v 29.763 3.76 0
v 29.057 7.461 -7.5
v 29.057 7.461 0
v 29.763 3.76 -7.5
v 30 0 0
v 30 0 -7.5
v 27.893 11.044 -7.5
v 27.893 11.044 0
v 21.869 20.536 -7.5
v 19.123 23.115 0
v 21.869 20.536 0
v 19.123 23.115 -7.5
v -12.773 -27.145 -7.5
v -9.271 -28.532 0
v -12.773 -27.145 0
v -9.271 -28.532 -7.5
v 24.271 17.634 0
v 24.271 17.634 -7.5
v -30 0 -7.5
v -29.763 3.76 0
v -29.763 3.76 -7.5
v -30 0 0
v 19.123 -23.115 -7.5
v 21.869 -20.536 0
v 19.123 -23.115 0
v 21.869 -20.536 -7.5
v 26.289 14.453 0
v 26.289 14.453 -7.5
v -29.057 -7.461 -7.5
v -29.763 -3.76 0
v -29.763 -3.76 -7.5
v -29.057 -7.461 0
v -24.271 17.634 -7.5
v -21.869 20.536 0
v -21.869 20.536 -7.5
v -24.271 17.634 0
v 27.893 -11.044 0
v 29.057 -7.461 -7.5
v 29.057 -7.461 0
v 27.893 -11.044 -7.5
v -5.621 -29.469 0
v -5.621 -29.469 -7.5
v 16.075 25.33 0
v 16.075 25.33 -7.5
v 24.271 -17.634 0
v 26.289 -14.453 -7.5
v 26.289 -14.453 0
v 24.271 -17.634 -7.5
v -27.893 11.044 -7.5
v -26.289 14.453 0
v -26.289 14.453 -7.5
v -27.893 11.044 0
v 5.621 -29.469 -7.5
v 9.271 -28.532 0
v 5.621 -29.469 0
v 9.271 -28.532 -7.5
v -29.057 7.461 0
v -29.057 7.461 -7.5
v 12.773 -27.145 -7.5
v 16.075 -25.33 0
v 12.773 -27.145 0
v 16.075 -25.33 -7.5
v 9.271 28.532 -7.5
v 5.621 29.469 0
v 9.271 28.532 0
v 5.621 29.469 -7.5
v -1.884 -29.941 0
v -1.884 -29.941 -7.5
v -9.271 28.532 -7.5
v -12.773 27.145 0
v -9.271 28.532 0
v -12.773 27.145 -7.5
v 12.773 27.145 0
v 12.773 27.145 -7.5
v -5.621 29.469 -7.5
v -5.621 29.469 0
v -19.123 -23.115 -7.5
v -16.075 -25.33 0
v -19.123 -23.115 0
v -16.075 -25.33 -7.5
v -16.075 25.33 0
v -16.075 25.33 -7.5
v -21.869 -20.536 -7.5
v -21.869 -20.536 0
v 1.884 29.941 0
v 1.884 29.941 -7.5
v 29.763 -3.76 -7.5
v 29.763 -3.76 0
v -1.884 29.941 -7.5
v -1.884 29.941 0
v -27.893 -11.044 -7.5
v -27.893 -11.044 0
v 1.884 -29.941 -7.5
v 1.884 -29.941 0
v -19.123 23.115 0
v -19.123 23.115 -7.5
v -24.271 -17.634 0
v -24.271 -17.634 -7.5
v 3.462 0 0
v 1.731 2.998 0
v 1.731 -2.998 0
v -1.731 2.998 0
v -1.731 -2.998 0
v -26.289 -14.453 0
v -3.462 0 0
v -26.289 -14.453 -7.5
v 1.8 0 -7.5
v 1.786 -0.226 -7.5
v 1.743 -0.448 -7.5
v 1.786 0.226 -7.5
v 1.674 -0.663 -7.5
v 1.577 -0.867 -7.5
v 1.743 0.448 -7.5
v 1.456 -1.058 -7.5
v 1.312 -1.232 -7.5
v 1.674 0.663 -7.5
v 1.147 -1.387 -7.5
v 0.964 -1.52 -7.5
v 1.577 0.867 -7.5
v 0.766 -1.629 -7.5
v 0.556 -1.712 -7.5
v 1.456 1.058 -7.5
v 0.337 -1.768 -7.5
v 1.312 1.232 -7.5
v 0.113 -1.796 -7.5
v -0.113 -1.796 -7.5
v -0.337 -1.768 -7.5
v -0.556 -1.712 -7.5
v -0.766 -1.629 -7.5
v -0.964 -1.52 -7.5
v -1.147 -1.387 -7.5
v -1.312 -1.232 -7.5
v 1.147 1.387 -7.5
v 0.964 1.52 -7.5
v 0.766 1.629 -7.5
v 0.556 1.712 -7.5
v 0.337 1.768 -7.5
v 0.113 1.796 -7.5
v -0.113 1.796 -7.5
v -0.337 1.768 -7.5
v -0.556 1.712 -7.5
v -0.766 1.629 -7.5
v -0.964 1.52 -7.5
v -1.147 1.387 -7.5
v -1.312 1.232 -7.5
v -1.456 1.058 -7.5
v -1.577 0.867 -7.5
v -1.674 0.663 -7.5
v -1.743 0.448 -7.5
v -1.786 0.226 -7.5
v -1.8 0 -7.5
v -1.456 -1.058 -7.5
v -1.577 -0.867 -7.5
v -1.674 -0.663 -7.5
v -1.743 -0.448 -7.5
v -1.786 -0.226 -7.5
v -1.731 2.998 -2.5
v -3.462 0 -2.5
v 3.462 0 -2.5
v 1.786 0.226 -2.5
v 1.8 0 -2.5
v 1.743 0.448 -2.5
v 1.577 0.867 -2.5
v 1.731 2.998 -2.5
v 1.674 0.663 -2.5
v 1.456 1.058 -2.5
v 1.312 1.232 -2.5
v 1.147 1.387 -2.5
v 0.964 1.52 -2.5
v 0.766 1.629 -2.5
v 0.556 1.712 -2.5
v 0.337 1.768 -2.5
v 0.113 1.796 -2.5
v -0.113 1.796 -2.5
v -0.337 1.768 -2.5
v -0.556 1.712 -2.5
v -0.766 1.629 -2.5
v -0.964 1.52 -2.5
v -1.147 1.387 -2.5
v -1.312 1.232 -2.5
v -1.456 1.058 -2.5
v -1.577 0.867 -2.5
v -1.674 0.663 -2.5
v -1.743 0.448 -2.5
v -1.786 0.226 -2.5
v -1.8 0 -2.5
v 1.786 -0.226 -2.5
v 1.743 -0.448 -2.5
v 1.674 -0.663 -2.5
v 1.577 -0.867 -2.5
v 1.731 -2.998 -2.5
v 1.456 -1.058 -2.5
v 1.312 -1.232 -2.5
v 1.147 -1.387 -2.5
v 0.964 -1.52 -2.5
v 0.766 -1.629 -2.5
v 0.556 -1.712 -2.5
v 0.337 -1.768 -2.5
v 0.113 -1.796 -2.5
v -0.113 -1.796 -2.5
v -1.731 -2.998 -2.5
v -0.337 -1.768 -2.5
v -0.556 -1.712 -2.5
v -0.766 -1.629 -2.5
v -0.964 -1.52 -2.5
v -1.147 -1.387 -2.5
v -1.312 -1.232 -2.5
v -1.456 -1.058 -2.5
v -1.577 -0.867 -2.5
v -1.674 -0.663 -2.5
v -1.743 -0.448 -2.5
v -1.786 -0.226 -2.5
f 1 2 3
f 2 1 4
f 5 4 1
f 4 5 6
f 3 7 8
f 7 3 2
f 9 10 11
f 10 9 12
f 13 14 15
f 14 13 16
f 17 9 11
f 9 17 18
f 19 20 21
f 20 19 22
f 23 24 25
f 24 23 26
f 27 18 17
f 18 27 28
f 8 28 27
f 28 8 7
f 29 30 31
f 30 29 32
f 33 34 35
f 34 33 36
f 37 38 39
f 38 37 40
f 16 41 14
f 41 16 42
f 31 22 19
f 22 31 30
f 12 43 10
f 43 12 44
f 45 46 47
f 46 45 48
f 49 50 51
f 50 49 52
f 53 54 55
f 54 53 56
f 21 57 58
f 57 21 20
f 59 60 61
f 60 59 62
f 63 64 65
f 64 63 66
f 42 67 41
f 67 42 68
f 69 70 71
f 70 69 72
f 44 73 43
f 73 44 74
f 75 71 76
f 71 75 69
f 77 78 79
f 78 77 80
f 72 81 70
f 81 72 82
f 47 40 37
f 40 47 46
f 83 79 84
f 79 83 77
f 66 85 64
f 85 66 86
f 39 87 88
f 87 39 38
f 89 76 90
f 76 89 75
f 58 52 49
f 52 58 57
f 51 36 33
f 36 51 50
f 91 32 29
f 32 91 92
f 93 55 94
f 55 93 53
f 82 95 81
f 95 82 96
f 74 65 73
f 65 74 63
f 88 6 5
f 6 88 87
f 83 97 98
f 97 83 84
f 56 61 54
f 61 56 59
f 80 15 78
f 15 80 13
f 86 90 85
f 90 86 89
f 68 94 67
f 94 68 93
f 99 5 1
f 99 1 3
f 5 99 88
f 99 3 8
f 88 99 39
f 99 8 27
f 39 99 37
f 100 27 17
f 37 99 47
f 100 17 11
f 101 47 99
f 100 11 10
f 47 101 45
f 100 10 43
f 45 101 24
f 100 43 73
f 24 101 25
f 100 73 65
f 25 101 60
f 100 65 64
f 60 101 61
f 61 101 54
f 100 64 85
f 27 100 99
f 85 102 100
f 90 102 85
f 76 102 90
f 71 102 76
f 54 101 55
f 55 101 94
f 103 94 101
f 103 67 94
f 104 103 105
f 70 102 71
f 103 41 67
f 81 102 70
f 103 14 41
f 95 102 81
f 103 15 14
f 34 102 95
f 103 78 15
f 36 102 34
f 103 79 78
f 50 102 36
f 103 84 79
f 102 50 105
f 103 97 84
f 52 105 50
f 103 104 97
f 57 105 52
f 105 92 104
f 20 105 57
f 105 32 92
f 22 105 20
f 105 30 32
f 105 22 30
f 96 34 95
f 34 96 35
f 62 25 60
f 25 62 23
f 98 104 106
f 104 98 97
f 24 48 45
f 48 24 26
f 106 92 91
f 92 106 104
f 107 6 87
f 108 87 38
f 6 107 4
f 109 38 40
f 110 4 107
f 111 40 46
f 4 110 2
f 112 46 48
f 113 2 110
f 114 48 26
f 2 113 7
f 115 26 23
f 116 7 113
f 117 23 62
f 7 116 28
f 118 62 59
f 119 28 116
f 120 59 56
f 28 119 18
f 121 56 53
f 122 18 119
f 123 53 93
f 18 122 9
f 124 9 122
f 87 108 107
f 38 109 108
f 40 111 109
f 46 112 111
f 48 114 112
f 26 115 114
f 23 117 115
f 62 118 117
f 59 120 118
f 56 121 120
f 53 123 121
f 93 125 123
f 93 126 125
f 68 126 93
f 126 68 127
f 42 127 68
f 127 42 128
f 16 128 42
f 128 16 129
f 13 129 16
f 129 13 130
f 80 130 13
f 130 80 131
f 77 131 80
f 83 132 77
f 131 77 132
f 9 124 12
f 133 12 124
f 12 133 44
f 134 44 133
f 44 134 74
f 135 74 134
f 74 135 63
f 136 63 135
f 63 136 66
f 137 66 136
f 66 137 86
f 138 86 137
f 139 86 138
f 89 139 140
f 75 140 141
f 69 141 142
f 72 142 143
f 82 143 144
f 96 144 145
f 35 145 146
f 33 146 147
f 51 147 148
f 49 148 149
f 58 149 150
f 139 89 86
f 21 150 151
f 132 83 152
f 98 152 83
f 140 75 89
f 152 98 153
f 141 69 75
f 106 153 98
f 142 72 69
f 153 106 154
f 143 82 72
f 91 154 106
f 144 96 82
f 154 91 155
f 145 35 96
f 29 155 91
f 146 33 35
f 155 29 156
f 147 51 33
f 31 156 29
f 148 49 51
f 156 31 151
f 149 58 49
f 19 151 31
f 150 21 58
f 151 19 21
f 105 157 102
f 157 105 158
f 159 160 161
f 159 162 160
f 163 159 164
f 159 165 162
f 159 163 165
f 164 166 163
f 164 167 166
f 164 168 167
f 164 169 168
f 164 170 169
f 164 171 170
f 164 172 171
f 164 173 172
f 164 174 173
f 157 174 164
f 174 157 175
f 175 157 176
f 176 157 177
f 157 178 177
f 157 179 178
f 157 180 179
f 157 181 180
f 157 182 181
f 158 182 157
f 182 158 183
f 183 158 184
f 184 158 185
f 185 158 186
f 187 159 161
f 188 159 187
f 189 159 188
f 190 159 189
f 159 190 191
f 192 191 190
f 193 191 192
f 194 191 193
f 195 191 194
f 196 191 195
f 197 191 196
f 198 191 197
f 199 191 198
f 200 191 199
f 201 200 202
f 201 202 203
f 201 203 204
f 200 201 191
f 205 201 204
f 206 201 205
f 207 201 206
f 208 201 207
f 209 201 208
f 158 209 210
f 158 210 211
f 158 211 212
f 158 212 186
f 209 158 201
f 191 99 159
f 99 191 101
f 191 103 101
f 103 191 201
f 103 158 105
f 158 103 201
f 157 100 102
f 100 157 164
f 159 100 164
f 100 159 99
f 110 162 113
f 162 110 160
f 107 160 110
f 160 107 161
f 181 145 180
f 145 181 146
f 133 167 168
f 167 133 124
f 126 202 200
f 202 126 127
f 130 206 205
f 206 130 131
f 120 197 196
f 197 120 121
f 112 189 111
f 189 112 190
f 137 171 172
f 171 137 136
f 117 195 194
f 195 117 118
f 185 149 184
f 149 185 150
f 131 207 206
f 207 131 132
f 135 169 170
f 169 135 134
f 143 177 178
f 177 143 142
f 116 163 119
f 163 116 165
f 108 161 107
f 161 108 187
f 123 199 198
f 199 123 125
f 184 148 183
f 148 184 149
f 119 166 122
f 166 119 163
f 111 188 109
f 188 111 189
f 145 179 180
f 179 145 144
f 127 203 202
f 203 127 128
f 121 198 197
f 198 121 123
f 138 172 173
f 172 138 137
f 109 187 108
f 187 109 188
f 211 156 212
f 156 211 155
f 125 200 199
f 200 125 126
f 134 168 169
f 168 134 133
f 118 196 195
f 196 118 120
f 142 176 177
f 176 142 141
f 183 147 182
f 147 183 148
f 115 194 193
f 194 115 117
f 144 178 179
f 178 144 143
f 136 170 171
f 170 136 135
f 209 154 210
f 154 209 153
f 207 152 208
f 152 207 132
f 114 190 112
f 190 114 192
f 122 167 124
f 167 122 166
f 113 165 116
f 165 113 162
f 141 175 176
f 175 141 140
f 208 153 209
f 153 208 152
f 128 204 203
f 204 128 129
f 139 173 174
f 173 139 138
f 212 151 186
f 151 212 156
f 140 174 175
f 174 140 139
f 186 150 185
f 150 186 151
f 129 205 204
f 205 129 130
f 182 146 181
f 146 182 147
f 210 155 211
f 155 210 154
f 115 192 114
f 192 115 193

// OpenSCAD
$fn = 50;


difference() {
	union() {
		translate(v = [0, 0, -7.5000000000]) {
			cylinder(h = 7.5000000000, r = 30.0000000000);
		}
		translate(v = [0, 0, -6.0000000000]) {
			cylinder(h = 6, r = 2.8750000000);
		}
	}
	union() {
		translate(v = [0, 0, 0]) {
			rotate(a = [0, 0, 0]) {
				difference() {
					union() {
						translate(v = [0, 0, -2.5000000000]) {
							linear_extrude(height = 2.5000000000) {
								polygon(points = [[3.4620000000, 0.0000000000], [1.7310000000, 2.9981799479], [-1.7310000000, 2.9981799479], [-3.4620000000, 0.0000000000], [-1.7310000000, -2.9981799479], [1.7310000000, -2.9981799479]]);
							}
						}
					}
					union();
				}
			}
		}
		#translate(v = [0, 0, -100.0000000000]) {
			cylinder(h = 200, r = 1.8000000000);
		}
	}
}
